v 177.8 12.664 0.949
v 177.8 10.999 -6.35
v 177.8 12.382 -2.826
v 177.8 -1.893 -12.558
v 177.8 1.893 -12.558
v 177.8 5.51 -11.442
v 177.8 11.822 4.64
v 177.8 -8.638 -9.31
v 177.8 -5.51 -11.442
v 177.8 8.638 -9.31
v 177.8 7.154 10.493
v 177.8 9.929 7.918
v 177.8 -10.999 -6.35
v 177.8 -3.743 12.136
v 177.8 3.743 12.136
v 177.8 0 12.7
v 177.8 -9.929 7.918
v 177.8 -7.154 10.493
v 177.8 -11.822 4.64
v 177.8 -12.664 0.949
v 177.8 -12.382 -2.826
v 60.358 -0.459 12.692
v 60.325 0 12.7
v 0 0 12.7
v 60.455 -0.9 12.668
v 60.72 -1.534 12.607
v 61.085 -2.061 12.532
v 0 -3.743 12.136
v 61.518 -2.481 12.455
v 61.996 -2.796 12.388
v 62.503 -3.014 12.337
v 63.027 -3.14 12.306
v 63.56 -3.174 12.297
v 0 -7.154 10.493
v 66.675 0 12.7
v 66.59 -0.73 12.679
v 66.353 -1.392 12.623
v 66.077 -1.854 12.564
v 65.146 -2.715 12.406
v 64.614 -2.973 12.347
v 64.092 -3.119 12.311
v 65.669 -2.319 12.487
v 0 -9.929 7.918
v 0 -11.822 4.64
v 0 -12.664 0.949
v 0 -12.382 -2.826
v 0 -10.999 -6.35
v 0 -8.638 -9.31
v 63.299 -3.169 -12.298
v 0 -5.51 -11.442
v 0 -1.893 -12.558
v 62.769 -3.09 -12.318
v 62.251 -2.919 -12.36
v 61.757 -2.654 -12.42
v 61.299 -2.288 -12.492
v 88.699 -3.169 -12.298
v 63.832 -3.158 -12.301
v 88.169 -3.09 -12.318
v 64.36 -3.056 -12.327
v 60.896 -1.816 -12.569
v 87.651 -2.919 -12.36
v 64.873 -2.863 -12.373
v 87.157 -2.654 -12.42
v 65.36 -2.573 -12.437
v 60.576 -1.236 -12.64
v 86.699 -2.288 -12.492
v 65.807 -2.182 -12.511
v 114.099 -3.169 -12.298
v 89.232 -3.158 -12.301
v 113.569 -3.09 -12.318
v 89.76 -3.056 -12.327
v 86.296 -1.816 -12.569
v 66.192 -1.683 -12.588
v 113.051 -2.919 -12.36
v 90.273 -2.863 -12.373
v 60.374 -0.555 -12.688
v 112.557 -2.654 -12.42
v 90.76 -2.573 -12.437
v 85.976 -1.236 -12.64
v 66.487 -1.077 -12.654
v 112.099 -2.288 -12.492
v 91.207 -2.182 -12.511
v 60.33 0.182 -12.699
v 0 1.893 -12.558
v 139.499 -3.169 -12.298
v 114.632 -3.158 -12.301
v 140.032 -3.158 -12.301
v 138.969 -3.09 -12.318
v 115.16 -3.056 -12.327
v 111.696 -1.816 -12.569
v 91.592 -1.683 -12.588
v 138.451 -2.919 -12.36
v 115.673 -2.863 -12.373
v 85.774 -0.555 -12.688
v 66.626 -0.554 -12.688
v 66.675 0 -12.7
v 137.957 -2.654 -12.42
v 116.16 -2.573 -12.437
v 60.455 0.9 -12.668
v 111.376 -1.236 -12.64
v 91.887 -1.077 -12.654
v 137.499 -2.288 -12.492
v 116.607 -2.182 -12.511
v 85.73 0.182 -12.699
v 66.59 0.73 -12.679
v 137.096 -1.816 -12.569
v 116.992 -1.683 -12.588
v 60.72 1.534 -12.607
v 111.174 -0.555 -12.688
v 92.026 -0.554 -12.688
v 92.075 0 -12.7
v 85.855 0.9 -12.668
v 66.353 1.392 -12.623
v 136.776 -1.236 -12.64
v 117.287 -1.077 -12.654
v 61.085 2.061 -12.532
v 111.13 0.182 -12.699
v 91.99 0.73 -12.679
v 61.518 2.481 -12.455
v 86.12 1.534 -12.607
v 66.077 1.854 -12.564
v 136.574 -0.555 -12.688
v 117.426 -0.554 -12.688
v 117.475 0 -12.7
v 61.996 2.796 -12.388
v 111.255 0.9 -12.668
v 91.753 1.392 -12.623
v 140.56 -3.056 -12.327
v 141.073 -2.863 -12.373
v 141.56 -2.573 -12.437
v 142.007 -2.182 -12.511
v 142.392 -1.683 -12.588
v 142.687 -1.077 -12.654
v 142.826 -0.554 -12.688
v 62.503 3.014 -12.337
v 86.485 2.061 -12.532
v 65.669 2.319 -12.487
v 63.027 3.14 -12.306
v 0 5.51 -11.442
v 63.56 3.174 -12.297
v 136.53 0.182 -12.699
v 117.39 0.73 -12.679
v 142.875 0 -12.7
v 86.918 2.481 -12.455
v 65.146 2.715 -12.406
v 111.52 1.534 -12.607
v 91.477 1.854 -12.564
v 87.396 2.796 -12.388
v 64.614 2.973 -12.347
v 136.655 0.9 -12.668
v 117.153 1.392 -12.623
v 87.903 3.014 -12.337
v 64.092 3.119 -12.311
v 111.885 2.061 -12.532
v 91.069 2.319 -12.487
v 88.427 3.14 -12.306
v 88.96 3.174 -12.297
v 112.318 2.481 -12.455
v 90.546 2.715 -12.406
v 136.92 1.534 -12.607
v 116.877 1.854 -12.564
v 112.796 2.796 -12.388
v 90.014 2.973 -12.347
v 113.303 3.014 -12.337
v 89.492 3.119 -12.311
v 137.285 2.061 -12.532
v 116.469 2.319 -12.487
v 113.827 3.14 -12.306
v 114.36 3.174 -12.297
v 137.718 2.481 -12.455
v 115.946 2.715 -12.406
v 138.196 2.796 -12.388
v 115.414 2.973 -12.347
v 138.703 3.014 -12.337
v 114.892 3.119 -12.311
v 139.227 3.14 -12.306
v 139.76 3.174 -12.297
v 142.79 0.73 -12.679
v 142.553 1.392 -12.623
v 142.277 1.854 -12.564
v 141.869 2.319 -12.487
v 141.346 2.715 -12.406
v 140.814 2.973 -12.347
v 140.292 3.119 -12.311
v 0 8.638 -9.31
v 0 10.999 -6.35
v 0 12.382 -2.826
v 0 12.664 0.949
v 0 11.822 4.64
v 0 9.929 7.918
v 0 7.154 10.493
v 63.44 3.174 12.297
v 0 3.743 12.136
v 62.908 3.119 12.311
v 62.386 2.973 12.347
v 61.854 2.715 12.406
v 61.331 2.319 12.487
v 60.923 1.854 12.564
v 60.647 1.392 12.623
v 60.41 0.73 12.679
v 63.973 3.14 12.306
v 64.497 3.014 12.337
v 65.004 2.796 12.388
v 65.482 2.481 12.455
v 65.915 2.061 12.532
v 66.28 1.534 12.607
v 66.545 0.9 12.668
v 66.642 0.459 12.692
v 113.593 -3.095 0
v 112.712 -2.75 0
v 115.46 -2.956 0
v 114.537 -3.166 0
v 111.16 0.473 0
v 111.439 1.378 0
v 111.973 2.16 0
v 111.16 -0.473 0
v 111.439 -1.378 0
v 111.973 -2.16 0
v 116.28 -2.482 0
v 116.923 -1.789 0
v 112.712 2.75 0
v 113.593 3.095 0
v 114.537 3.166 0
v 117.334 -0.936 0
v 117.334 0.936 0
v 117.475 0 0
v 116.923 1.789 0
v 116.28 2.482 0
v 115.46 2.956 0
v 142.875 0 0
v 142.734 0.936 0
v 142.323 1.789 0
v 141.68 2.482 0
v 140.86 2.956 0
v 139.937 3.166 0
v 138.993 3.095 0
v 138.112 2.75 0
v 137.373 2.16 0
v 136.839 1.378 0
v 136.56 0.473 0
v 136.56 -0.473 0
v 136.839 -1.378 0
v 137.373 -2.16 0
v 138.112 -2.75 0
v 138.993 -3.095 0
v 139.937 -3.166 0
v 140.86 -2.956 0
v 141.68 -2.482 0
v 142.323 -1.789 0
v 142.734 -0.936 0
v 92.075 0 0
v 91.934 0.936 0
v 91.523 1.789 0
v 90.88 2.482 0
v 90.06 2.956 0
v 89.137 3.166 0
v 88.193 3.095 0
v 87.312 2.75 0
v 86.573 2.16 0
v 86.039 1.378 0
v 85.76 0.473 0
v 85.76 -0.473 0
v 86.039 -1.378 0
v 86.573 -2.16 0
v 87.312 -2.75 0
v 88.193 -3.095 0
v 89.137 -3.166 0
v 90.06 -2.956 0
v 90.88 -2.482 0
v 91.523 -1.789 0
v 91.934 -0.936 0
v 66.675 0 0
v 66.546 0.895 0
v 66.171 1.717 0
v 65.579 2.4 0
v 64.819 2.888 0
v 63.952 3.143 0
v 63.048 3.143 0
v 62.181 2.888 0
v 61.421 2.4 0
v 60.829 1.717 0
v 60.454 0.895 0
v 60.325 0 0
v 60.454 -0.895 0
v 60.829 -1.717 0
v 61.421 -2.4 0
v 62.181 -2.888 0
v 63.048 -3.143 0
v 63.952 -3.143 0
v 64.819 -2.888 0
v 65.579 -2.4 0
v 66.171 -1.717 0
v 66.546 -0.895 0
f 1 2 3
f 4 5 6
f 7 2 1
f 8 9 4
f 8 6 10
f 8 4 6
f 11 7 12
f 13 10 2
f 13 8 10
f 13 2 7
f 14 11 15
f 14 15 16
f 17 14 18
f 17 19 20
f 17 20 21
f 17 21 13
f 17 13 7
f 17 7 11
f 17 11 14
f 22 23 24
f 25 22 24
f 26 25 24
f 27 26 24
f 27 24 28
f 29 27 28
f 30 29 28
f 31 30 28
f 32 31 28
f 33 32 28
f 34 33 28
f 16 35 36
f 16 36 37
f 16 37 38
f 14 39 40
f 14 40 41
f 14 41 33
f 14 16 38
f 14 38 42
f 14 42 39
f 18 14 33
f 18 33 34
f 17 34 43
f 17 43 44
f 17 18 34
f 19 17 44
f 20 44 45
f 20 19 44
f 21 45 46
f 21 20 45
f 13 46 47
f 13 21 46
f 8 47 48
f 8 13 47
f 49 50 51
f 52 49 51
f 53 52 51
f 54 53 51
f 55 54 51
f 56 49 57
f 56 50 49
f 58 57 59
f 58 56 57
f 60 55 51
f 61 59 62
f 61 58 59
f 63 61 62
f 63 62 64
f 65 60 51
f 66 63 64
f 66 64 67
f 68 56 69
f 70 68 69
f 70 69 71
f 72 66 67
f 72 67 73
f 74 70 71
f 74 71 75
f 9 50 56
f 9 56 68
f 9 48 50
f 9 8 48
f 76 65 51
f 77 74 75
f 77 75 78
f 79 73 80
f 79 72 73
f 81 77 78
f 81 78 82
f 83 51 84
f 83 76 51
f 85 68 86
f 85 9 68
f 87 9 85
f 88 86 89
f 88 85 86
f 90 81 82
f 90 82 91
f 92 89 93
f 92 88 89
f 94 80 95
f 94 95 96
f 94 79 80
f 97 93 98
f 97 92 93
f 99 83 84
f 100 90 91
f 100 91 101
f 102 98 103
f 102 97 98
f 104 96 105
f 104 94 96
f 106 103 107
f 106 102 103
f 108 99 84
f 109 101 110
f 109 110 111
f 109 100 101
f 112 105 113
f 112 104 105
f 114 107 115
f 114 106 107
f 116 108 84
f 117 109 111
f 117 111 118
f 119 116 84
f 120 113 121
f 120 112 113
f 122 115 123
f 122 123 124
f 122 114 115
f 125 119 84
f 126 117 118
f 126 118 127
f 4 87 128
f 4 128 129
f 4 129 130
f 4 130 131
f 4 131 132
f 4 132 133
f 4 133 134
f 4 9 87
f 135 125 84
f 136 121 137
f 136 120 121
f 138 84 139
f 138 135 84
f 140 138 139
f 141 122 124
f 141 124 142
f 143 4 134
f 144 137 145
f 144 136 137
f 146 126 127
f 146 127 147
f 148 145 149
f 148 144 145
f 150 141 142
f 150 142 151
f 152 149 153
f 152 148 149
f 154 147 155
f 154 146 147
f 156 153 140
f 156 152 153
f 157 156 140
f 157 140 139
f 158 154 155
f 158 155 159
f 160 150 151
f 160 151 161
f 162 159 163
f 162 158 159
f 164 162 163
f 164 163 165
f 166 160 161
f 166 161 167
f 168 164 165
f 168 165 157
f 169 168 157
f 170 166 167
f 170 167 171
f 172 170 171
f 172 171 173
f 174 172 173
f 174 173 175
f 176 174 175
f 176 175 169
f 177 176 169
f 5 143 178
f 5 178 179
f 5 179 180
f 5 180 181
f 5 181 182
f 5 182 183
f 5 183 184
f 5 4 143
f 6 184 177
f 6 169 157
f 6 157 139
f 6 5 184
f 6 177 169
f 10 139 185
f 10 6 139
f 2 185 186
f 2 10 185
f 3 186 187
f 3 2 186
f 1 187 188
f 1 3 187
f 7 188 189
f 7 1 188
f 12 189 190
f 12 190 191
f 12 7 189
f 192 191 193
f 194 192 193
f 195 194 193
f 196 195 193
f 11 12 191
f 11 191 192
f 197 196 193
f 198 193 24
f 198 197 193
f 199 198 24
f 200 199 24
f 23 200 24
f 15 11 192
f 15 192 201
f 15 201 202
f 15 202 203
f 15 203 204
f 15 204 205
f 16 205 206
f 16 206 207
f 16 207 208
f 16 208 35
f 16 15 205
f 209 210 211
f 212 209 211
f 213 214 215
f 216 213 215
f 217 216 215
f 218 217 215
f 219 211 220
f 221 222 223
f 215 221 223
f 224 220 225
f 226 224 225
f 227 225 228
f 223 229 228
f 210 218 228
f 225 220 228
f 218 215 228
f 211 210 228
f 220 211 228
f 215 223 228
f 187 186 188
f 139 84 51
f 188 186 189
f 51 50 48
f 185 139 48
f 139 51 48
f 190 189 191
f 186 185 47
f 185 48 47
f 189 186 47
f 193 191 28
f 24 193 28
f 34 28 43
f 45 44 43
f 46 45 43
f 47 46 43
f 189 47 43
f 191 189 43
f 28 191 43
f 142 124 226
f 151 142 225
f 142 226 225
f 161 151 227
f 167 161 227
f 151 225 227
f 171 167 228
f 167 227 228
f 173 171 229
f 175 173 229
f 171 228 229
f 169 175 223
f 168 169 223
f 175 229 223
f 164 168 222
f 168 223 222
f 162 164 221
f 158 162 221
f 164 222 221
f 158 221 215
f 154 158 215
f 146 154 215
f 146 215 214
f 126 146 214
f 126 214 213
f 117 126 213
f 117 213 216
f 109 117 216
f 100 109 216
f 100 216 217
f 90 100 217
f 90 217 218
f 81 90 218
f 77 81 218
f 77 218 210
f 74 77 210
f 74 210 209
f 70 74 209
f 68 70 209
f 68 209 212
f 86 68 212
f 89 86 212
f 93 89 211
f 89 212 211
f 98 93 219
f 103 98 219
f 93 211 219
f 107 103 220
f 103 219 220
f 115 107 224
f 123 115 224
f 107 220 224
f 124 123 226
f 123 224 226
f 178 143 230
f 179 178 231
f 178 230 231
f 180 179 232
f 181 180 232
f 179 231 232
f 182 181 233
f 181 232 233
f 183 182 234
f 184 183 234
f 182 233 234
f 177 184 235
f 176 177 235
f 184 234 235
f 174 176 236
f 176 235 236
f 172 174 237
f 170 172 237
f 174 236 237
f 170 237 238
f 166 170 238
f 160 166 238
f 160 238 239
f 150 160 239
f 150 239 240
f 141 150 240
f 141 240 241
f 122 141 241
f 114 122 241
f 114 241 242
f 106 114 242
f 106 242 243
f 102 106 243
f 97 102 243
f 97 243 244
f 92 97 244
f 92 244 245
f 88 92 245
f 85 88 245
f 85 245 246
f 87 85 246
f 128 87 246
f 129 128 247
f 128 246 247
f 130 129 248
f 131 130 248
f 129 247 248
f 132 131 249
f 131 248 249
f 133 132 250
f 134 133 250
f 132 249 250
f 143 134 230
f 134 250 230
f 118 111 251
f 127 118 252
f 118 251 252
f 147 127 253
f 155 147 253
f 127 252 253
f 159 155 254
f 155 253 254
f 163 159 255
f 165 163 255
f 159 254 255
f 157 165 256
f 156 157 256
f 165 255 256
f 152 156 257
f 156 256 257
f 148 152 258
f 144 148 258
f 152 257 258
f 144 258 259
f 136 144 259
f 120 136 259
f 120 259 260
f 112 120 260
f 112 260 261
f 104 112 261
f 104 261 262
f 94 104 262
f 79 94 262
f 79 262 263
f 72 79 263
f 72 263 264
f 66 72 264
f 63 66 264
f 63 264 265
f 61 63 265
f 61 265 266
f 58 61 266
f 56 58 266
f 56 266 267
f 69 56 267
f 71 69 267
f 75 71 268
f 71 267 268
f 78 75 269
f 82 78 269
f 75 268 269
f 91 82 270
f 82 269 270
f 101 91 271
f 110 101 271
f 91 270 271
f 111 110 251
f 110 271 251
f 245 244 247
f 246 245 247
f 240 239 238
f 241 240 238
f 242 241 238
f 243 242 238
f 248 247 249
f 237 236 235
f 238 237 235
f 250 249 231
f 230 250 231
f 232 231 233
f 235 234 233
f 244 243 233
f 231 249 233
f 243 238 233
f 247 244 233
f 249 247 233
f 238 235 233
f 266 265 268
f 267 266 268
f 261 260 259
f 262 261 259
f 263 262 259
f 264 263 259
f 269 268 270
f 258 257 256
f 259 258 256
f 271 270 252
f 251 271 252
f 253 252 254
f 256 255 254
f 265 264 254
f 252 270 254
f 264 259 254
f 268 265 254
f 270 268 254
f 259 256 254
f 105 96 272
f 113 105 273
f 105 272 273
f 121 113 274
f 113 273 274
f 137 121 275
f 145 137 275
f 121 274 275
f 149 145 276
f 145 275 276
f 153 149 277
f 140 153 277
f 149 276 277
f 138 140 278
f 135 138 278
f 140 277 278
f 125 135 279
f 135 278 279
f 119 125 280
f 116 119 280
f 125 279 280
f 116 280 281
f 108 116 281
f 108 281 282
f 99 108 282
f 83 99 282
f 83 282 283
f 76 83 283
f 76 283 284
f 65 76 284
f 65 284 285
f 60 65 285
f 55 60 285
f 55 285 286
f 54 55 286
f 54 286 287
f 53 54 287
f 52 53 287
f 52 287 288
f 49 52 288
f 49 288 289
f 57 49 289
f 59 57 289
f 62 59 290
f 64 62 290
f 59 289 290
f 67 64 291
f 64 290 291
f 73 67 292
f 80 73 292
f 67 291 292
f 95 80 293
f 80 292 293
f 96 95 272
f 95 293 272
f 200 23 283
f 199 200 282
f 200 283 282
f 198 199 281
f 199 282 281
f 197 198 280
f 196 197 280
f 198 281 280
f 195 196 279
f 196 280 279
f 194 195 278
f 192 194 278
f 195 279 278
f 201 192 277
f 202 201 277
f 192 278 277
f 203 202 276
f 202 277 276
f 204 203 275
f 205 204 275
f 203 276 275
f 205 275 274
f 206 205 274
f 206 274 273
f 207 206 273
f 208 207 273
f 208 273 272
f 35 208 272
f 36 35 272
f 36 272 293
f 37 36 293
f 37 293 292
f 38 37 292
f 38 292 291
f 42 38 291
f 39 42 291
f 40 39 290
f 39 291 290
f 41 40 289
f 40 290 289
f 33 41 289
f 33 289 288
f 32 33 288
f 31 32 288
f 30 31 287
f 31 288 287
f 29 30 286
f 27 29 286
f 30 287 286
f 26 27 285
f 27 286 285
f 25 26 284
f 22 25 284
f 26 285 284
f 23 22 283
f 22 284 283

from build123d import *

# Parameters (mm, degrees)
SWEEP1_PROFILE_R   = 12.7
SKETCH18_R         = 3.175
CUT_EXTRUDE1_DEPTH = 179.704840449
LPATTERN1_COUNT    = 4
LPATTERN1_PITCH    = 25.4
SKETCH19_R         = 3.175
CUT_EXTRUDE2_DEPTH = 179.704840563


with BuildPart() as part:
    # Sweep1: sweep along a path in Sketch1
    with BuildLine(Plane.XY) as sweep1_path:
        Line((0, 0), (177.8, 0))
    # Sweep1 profile (on start of the path) → Sweep1 (sweep)
    with BuildSketch(Plane(origin=(0, 0, 0), x_dir=(0, 0, 1), z_dir=(1, 0, 0))):
        Circle(SWEEP1_PROFILE_R)
    sweep(path=sweep1_path.line)

    # Sketch18 → Cut-Extrude1 (cut, through all)
    with BuildSketch(Plane.XY):
        with Locations((139.7, 0)):
            Circle(SKETCH18_R)
    cut_extrude1 = extrude(amount=-CUT_EXTRUDE1_DEPTH, mode=Mode.SUBTRACT)

    # LPattern1: Cut-Extrude1 ×4
    with Locations(*[(-i * LPATTERN1_PITCH, 0, 0) for i in range(1, LPATTERN1_COUNT)]):
        add(cut_extrude1, mode=Mode.SUBTRACT)

    # Sketch19 → Cut-Extrude2 (cut, through all)
    with BuildSketch(Plane(origin=(0, 0, 0), x_dir=(-1, 0, 0), z_dir=(0, 0, -1))):
        with Locations((-63.5, 0)):
            Circle(SKETCH19_R)
    extrude(amount=-CUT_EXTRUDE2_DEPTH, mode=Mode.SUBTRACT)


solid = part.part
